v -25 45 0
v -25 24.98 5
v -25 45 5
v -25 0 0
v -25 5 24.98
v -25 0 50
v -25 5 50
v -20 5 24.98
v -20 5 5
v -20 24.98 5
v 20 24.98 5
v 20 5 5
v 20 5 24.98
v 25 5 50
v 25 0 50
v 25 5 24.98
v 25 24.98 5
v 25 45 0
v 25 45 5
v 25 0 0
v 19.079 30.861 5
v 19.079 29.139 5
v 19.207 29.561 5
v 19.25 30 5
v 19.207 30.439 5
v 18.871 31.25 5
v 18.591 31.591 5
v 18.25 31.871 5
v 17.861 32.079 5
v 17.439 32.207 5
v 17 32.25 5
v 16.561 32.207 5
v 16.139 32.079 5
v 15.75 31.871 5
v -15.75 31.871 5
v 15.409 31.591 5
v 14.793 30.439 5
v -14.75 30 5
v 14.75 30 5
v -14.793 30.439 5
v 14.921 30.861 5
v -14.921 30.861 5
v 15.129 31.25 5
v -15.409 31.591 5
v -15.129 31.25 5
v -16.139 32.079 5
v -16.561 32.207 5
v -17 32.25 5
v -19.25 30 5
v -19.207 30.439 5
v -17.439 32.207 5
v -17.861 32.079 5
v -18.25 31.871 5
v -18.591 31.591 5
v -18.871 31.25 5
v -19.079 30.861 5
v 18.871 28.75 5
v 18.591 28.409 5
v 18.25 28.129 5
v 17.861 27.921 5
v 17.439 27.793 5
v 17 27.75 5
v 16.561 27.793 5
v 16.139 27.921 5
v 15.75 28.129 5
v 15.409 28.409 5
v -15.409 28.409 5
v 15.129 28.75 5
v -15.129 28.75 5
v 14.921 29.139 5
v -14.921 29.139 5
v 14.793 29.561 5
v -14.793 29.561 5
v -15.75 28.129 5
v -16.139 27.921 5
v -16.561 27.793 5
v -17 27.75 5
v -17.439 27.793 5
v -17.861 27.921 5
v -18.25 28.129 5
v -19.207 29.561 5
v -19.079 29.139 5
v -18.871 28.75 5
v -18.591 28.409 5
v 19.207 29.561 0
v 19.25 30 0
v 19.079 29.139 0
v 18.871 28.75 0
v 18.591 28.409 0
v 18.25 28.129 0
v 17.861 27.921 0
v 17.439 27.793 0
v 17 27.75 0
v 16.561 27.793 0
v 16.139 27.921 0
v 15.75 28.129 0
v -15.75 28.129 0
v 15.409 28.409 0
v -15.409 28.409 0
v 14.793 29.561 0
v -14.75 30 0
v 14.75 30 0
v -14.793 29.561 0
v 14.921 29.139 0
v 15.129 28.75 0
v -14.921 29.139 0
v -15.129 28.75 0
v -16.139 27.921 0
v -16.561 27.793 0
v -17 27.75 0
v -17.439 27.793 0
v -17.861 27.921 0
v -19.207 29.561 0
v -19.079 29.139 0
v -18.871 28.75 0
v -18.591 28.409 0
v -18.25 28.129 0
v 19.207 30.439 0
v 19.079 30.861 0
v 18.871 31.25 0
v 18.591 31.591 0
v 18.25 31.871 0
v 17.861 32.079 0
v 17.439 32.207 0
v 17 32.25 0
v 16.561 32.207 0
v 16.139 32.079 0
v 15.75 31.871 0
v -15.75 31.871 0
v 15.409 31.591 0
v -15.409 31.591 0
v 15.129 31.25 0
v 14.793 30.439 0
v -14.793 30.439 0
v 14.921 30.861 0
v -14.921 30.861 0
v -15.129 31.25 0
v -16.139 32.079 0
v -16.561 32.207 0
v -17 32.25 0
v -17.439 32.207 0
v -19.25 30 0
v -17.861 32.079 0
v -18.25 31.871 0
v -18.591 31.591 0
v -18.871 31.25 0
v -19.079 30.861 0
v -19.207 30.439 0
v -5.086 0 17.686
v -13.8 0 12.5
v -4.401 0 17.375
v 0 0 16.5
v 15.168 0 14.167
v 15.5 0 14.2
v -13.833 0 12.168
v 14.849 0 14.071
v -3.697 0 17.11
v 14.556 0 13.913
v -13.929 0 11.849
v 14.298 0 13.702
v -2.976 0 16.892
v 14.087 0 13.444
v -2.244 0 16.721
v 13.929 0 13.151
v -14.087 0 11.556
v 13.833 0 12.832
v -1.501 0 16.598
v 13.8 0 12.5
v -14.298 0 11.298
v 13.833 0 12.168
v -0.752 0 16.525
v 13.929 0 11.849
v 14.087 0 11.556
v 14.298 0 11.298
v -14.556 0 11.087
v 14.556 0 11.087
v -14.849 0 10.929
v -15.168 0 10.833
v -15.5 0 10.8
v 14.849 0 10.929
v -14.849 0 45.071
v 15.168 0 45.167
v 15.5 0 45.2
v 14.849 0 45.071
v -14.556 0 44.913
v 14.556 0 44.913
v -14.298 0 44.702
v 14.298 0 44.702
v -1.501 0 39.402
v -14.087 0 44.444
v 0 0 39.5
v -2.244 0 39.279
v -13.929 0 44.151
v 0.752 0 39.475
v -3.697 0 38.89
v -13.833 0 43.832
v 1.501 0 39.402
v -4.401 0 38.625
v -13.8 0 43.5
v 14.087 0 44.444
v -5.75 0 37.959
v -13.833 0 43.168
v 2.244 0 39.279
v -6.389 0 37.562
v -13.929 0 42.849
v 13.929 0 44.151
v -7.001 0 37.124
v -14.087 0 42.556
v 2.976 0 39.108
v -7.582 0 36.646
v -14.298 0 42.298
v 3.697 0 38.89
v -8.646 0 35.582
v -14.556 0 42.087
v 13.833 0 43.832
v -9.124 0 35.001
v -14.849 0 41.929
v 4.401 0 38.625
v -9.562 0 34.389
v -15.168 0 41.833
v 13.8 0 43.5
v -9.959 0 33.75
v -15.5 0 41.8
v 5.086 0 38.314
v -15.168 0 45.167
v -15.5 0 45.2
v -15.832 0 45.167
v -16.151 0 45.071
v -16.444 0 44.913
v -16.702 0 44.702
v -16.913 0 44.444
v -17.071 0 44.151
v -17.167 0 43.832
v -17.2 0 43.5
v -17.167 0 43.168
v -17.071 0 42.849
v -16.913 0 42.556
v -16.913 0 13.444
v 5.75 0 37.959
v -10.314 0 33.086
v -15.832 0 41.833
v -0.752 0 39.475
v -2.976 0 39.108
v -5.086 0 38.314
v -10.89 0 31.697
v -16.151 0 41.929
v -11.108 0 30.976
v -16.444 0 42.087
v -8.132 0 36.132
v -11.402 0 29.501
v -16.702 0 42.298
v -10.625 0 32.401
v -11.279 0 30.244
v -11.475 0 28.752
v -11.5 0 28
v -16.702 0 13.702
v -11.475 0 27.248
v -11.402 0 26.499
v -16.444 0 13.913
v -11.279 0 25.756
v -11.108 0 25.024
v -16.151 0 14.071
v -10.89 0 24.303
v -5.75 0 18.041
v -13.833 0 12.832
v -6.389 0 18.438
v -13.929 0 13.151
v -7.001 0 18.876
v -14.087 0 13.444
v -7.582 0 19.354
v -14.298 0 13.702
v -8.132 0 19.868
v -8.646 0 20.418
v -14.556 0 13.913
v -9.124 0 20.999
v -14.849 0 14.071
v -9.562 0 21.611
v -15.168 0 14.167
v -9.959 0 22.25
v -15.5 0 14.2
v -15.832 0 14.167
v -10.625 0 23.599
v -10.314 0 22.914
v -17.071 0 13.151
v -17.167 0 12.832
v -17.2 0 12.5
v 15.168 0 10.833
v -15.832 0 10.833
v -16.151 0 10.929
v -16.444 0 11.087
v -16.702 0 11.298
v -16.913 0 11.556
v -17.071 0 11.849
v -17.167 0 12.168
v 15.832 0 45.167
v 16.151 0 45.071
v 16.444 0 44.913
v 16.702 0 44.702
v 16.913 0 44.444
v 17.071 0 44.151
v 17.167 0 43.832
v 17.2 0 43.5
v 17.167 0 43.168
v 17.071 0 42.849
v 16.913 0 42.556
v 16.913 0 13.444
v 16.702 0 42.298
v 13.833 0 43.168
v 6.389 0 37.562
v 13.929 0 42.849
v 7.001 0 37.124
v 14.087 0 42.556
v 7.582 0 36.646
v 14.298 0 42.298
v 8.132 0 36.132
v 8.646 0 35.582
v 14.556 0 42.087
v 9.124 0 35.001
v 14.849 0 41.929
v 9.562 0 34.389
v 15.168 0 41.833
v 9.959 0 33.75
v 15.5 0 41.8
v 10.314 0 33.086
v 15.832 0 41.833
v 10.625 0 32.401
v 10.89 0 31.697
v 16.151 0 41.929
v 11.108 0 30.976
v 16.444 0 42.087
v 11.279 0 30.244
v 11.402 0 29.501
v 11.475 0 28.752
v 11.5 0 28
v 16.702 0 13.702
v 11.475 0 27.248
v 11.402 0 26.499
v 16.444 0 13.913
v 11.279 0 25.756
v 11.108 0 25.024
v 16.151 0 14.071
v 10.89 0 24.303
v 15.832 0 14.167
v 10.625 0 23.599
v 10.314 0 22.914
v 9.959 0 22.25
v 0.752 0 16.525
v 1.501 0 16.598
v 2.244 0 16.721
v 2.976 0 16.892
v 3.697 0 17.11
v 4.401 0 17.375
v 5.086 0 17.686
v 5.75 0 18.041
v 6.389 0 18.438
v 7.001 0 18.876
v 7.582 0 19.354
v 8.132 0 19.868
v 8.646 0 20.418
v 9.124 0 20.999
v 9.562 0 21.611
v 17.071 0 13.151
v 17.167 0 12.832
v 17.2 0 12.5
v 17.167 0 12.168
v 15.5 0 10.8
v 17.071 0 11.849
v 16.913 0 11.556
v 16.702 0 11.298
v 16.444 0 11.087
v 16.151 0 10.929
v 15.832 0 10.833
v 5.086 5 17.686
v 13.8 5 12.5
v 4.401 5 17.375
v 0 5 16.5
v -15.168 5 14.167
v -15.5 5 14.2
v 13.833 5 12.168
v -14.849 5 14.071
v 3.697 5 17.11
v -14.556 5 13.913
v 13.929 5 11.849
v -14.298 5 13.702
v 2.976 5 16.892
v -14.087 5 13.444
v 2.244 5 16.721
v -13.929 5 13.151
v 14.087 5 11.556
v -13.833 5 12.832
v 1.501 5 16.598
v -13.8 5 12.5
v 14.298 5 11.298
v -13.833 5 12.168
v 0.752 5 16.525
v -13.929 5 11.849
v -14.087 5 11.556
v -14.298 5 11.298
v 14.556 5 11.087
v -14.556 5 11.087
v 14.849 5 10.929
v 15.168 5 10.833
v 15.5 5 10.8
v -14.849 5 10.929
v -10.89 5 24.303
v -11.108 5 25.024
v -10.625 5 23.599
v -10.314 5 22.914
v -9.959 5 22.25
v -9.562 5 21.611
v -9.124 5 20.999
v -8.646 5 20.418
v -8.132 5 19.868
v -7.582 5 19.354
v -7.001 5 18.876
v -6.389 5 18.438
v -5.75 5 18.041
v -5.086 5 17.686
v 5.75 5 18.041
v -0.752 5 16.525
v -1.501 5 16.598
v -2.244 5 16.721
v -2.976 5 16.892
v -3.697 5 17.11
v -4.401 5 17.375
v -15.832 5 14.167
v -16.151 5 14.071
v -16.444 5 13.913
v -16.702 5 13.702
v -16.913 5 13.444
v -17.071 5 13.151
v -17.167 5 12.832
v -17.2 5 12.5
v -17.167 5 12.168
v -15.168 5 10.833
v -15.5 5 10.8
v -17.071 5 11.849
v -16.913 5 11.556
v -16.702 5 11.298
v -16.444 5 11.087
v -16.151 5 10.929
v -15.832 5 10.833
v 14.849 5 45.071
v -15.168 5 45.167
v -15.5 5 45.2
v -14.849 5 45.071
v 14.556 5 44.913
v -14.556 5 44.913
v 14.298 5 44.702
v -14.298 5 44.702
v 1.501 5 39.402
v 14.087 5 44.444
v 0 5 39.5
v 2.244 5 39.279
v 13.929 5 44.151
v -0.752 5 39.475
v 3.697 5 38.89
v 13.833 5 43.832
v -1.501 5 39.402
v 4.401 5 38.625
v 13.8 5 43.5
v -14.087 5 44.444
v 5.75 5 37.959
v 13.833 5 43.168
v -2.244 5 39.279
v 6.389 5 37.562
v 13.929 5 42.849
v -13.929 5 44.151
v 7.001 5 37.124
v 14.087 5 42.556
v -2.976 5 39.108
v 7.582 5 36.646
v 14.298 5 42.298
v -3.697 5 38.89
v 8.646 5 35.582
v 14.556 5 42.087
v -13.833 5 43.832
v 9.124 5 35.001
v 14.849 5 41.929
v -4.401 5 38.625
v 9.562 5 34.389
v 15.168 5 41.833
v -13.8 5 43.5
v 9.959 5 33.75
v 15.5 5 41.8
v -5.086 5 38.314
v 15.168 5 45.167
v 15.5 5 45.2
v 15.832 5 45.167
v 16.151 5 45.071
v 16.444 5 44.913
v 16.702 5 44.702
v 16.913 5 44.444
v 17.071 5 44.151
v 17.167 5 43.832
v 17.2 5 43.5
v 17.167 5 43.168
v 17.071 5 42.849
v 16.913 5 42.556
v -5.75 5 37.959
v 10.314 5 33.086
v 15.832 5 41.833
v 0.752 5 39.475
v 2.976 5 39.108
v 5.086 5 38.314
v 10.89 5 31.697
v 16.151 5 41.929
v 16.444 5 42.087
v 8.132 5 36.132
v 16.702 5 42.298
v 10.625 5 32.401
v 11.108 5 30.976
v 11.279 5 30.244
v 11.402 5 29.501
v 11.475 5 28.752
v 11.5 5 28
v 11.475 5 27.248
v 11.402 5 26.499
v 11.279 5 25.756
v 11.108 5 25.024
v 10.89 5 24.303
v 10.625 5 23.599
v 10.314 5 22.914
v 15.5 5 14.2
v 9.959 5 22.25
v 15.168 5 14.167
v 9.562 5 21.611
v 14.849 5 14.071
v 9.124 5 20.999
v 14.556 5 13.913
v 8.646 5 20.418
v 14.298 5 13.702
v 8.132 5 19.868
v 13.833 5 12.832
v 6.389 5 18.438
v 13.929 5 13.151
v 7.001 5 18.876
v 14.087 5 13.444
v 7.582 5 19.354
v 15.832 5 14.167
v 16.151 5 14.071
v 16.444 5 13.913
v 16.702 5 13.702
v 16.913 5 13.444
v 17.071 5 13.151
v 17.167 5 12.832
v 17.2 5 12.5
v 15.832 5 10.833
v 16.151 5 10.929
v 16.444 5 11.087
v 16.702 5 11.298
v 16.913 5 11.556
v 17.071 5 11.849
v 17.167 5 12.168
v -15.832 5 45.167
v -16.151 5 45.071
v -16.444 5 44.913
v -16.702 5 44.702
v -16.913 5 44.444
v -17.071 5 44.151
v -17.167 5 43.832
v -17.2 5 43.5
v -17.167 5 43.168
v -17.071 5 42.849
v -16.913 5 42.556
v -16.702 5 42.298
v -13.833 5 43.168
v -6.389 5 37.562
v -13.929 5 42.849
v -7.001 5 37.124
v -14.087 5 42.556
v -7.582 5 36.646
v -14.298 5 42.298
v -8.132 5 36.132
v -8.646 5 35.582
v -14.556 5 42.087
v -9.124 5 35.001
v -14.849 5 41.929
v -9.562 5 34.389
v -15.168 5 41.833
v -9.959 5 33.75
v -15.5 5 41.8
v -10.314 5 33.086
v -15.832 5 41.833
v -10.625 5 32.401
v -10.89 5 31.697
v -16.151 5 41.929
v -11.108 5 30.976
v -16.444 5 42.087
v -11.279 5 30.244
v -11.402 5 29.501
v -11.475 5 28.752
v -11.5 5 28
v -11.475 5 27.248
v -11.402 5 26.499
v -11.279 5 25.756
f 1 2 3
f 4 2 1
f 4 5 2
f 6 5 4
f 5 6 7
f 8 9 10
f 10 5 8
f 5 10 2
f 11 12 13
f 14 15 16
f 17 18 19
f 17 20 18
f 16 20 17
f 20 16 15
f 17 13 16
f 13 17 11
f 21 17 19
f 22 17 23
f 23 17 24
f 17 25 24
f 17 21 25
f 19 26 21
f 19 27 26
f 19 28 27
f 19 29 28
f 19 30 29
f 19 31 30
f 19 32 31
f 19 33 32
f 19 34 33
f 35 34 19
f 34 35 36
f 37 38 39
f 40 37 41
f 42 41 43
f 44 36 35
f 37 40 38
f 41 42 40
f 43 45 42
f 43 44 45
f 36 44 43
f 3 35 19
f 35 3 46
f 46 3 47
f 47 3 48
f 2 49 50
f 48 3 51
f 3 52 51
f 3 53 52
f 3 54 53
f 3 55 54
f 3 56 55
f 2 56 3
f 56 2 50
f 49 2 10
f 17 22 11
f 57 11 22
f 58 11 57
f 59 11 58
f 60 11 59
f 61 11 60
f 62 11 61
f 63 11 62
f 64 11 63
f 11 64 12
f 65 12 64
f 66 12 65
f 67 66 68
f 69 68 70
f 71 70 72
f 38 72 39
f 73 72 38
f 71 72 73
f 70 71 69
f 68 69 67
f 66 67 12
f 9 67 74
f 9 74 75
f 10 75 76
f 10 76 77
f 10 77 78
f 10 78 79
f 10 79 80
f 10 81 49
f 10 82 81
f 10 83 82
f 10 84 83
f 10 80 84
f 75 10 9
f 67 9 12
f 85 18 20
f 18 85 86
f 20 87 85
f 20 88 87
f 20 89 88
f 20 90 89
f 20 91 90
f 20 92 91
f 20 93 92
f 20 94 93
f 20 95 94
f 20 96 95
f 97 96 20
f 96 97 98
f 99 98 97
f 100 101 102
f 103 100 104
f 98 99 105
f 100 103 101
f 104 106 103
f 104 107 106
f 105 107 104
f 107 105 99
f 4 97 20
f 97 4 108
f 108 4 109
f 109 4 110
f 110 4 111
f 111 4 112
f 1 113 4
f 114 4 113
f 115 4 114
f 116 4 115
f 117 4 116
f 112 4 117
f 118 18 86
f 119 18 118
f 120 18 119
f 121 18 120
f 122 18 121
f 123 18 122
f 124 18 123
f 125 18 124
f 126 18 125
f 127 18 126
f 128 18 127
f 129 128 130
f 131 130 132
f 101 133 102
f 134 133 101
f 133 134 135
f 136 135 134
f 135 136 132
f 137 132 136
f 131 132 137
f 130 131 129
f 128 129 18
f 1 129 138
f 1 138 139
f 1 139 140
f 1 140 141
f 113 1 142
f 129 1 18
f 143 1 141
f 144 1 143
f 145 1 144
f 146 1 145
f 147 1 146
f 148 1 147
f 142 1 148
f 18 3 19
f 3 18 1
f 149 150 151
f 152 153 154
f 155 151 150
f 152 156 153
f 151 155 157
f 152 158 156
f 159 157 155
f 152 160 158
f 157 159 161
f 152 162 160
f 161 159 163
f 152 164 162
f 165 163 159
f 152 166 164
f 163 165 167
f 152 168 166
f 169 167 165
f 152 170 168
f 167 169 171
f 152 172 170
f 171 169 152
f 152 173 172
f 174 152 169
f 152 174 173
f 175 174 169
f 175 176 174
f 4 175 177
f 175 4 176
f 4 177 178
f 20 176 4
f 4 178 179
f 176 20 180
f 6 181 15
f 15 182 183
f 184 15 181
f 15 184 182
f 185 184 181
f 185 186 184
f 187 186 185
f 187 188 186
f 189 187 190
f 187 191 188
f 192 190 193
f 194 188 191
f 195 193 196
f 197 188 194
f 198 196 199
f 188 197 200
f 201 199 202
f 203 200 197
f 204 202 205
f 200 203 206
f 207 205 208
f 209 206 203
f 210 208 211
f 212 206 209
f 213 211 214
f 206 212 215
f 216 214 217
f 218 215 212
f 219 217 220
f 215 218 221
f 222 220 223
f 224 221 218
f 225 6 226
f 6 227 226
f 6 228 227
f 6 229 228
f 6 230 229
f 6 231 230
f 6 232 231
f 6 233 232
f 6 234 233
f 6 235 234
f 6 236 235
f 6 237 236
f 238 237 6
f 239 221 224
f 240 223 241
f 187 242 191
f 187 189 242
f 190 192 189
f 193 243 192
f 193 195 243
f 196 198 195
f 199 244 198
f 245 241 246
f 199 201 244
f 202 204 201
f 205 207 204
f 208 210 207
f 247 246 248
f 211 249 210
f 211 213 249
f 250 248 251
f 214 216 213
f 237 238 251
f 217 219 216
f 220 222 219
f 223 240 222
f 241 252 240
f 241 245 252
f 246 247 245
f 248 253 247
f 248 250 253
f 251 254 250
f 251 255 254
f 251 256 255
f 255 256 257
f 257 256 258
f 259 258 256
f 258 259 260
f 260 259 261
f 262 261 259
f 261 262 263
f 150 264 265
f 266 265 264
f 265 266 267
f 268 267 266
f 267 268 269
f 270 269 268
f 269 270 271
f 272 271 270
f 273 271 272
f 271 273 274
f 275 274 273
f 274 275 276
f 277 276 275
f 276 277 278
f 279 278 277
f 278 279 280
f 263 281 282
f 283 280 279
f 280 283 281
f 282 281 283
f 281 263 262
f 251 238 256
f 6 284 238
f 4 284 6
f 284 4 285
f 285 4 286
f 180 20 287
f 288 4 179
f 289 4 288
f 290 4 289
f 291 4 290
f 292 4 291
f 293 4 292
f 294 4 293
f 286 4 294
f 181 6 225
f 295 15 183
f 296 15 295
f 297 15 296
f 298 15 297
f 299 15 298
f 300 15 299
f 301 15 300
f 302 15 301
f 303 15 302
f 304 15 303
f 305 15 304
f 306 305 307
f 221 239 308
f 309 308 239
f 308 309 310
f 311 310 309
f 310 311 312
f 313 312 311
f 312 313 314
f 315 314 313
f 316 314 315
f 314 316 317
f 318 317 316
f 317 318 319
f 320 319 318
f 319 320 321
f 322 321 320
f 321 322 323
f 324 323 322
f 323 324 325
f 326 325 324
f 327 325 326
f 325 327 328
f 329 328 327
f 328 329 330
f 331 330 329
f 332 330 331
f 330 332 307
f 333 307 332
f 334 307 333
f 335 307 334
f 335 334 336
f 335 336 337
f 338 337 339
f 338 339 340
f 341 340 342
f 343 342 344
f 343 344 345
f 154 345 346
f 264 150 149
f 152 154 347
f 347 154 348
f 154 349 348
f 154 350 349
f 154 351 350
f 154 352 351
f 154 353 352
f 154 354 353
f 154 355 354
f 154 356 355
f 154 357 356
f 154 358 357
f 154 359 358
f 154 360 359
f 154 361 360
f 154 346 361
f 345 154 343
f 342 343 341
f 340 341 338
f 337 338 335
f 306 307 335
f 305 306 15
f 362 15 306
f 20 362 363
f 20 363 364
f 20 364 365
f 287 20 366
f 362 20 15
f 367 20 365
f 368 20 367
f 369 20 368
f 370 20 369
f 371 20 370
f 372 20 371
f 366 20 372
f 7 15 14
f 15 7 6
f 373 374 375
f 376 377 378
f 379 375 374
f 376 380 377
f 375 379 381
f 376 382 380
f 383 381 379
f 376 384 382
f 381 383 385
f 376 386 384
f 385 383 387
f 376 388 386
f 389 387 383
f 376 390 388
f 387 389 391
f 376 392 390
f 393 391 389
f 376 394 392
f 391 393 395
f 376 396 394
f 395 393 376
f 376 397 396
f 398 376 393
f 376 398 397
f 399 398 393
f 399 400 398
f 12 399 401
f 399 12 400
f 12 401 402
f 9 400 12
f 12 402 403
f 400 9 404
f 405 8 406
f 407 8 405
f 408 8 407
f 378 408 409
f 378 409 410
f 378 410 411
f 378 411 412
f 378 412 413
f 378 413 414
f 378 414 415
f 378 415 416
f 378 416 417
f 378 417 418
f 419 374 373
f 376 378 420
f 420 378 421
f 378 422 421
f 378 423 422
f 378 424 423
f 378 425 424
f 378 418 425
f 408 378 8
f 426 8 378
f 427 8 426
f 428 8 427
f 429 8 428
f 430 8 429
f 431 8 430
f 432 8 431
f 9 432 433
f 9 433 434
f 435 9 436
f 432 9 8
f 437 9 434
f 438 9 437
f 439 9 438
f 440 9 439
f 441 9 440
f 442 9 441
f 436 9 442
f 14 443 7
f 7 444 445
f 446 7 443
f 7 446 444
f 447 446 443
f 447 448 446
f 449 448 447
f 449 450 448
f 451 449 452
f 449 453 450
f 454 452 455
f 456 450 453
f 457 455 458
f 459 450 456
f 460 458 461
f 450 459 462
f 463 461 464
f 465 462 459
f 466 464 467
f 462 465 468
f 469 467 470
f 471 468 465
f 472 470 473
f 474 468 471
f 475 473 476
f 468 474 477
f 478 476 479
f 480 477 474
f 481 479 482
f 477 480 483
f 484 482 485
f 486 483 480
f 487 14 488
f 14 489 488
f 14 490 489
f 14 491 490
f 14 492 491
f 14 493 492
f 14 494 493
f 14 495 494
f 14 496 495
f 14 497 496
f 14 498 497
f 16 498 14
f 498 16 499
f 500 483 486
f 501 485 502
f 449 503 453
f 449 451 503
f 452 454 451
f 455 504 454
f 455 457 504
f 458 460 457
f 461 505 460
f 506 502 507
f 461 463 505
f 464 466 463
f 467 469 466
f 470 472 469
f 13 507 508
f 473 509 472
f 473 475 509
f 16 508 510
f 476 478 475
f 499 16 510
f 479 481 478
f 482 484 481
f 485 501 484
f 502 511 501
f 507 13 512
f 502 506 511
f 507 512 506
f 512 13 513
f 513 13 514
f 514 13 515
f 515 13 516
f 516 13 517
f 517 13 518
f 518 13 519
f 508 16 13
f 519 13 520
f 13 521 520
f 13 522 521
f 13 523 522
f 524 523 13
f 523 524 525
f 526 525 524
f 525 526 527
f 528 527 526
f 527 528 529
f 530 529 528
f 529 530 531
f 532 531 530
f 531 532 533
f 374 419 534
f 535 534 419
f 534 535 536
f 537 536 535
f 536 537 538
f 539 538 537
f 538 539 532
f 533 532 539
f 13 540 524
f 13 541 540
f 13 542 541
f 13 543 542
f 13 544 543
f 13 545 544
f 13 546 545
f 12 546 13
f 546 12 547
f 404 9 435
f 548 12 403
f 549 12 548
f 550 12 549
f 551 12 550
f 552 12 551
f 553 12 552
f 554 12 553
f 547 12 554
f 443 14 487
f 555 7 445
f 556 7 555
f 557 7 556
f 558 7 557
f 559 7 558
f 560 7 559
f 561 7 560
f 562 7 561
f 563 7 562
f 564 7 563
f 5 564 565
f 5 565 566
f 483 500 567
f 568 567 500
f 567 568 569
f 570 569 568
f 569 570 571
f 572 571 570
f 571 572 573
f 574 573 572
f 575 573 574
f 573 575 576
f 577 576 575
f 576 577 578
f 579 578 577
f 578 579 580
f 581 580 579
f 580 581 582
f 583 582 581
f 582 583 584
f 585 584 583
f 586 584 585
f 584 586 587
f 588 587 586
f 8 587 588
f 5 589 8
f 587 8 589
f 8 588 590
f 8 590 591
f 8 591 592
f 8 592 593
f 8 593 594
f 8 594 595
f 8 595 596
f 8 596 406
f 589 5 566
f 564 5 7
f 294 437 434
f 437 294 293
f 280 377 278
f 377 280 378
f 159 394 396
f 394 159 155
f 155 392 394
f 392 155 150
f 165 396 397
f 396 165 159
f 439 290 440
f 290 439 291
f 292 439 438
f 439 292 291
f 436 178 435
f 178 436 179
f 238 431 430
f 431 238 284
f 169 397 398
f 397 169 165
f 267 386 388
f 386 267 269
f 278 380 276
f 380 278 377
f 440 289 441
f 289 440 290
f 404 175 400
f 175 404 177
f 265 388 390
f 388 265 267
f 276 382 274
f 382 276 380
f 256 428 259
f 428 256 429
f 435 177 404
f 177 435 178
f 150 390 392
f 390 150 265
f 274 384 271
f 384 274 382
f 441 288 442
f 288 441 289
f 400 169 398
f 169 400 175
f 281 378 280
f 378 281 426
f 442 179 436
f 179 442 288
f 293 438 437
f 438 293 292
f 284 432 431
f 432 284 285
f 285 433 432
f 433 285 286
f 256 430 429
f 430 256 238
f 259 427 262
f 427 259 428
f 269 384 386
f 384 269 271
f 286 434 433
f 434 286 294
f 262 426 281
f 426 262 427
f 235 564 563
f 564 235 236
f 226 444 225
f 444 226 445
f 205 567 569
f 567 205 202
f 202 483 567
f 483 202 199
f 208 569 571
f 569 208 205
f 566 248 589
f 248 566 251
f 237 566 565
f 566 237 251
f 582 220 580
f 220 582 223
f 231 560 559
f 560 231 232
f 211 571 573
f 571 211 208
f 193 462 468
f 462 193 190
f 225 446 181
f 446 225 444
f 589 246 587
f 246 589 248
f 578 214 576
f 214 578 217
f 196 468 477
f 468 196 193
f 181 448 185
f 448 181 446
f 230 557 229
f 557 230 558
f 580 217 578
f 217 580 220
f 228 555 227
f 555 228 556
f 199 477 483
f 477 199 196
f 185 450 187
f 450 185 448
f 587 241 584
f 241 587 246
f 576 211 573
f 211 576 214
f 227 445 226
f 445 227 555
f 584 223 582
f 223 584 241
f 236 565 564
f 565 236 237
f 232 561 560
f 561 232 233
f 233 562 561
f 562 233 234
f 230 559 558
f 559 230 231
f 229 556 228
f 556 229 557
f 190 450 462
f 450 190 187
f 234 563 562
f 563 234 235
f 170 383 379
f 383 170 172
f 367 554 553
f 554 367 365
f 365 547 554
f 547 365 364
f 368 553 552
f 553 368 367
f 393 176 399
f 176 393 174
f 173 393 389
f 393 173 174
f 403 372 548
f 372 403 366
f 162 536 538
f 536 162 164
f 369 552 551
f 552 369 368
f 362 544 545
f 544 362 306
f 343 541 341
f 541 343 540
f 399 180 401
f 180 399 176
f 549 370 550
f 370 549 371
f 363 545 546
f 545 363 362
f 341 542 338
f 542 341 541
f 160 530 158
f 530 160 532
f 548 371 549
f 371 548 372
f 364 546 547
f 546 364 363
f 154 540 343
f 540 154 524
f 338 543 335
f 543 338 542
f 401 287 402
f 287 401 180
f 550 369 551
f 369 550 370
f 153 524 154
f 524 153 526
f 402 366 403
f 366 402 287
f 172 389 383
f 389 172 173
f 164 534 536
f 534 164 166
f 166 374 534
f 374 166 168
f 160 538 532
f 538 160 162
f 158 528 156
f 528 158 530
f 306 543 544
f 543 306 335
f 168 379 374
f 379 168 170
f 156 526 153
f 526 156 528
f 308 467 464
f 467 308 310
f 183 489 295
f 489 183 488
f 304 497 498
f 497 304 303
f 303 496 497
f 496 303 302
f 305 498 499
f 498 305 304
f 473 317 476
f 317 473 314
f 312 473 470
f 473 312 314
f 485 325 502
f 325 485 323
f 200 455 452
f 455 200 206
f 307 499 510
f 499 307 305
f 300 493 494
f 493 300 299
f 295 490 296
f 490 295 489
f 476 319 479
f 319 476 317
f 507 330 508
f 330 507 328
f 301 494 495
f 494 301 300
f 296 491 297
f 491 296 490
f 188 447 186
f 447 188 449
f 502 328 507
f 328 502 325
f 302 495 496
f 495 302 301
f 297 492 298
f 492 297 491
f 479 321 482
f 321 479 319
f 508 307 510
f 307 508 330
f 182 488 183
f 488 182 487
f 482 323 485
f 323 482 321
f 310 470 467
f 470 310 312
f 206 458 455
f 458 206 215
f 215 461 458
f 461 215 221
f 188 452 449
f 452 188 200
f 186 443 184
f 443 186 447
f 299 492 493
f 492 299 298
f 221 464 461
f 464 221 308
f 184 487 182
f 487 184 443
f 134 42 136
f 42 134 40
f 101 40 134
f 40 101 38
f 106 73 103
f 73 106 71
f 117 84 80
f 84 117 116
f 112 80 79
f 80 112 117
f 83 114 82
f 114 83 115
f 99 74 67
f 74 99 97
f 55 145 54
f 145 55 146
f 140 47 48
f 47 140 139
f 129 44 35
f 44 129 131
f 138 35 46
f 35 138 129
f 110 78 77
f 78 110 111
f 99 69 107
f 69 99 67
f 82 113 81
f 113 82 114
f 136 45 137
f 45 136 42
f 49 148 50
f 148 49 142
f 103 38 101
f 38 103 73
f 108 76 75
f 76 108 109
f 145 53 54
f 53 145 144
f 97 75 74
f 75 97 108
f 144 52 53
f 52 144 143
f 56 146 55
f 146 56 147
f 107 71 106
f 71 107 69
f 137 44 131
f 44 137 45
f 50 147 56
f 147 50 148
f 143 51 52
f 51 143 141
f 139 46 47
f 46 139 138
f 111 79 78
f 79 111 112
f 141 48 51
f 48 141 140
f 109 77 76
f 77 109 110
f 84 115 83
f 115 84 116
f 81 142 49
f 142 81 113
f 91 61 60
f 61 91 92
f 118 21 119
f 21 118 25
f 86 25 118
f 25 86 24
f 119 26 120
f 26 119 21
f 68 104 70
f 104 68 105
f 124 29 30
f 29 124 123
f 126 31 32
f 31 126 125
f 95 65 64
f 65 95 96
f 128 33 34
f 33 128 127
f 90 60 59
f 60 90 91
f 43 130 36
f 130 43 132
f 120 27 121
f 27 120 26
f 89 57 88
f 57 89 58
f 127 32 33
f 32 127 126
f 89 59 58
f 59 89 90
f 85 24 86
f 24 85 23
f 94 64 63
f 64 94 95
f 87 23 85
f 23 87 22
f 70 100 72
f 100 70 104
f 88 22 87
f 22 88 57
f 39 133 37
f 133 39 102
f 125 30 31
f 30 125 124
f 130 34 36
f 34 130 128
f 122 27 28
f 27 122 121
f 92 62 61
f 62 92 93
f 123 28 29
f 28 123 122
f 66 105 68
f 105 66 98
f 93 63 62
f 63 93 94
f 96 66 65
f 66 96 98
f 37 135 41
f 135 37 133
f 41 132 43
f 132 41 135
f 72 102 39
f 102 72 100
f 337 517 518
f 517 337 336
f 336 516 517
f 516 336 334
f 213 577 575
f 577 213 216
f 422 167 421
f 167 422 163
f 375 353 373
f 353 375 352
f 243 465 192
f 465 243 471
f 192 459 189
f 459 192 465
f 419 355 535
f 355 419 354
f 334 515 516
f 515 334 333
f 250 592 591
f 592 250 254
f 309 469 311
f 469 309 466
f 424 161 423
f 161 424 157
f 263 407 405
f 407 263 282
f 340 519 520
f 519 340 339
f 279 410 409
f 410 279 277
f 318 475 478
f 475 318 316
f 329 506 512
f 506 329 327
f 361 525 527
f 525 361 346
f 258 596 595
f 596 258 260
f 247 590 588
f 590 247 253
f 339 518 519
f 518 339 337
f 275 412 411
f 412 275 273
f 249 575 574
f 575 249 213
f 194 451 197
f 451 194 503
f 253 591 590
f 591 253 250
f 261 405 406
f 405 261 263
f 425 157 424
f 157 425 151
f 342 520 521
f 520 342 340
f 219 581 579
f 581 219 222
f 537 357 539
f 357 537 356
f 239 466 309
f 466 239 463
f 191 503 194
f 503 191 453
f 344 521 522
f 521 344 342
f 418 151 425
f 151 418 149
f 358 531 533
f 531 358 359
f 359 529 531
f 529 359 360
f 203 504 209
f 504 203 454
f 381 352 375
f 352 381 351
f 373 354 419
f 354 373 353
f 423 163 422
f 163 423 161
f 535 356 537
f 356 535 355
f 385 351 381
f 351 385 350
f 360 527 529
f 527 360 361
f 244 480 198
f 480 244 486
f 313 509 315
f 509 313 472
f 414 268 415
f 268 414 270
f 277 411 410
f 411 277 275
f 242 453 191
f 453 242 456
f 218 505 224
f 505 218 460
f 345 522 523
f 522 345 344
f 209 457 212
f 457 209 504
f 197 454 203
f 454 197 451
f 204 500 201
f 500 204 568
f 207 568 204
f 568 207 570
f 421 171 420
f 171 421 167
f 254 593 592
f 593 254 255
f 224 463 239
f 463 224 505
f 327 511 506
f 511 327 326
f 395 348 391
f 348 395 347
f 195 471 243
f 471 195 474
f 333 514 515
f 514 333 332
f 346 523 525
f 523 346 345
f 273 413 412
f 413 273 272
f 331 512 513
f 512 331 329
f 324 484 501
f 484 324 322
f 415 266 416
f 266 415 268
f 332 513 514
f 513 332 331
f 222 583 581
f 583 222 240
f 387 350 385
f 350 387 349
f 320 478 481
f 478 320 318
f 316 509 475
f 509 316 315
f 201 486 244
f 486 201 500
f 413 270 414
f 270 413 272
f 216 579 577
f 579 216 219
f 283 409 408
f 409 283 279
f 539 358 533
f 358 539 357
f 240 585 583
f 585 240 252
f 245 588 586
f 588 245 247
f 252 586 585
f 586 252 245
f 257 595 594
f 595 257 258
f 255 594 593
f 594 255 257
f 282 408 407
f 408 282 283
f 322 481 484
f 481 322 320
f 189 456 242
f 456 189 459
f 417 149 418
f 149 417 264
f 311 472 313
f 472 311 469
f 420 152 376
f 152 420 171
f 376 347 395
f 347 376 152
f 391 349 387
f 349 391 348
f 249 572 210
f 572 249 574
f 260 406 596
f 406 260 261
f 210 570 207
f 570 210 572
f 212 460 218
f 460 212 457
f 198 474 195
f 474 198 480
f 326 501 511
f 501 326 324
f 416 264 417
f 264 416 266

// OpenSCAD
// L-bracket for a NEMA 17 stepper motor (syringe pumps, peristaltic pumps, shakers)
// Category: full hardware. Base plate with two M4 holes, vertical motor plate with
// the 22 mm boss hole + 31 mm M3 pattern, two gussets. Motor body mounts on the
// back (-Y) side, shaft pointing over the base.
// Print: PETG, base on the bed, 0.2 mm layers, 5 perimeters, 30 % infill.
// SPDX-License-Identifier: CERN-OHL-P-2.0

/* [Bracket] */
base = [50, 45, 5];      // X, Y, Z: spans y = 0..45
plate = [50, 5, 50];     // vertical plate at y = 0..5
boss_d = 23;             // NEMA 17 centring boss is 22 mm
boss_z = 28;             // motor axis height
screw_d = 3.4;           // M3 clearance
screw_spacing = 31;      // NEMA 17 bolt pattern
mount_d = 4.5;           // M4 clearance
mount_pos = [[-17, 30], [17, 30]];
gusset_t = 5;
gusset_len = 20;

/* [Hidden] */
eps = 0.01;

difference() {
    union() {
        translate([-base.x / 2, 0, 0]) cube(base);
        translate([-plate.x / 2, 0, 0]) cube(plate);
        for (sx = [-1, 1])
            translate([sx * (base.x / 2 - gusset_t / 2) - gusset_t / 2, plate.y - eps, base.z - eps])
                rotate([90, 0, 90]) linear_extrude(gusset_t)
                    polygon([[0, 0], [gusset_len, 0], [0, gusset_len]]);
    }
    translate([0, -1, boss_z]) rotate([-90, 0, 0]) cylinder(d = boss_d, h = plate.y + 2, $fn = 96);
    for (sx = [-1, 1], sz = [-1, 1])
        translate([sx * screw_spacing / 2, -1, boss_z + sz * screw_spacing / 2])
            rotate([-90, 0, 0]) cylinder(d = screw_d, h = plate.y + 2, $fn = 32);
    for (p = mount_pos)
        translate([p.x, p.y, -1]) cylinder(d = mount_d, h = base.z + 2, $fn = 32);
}
